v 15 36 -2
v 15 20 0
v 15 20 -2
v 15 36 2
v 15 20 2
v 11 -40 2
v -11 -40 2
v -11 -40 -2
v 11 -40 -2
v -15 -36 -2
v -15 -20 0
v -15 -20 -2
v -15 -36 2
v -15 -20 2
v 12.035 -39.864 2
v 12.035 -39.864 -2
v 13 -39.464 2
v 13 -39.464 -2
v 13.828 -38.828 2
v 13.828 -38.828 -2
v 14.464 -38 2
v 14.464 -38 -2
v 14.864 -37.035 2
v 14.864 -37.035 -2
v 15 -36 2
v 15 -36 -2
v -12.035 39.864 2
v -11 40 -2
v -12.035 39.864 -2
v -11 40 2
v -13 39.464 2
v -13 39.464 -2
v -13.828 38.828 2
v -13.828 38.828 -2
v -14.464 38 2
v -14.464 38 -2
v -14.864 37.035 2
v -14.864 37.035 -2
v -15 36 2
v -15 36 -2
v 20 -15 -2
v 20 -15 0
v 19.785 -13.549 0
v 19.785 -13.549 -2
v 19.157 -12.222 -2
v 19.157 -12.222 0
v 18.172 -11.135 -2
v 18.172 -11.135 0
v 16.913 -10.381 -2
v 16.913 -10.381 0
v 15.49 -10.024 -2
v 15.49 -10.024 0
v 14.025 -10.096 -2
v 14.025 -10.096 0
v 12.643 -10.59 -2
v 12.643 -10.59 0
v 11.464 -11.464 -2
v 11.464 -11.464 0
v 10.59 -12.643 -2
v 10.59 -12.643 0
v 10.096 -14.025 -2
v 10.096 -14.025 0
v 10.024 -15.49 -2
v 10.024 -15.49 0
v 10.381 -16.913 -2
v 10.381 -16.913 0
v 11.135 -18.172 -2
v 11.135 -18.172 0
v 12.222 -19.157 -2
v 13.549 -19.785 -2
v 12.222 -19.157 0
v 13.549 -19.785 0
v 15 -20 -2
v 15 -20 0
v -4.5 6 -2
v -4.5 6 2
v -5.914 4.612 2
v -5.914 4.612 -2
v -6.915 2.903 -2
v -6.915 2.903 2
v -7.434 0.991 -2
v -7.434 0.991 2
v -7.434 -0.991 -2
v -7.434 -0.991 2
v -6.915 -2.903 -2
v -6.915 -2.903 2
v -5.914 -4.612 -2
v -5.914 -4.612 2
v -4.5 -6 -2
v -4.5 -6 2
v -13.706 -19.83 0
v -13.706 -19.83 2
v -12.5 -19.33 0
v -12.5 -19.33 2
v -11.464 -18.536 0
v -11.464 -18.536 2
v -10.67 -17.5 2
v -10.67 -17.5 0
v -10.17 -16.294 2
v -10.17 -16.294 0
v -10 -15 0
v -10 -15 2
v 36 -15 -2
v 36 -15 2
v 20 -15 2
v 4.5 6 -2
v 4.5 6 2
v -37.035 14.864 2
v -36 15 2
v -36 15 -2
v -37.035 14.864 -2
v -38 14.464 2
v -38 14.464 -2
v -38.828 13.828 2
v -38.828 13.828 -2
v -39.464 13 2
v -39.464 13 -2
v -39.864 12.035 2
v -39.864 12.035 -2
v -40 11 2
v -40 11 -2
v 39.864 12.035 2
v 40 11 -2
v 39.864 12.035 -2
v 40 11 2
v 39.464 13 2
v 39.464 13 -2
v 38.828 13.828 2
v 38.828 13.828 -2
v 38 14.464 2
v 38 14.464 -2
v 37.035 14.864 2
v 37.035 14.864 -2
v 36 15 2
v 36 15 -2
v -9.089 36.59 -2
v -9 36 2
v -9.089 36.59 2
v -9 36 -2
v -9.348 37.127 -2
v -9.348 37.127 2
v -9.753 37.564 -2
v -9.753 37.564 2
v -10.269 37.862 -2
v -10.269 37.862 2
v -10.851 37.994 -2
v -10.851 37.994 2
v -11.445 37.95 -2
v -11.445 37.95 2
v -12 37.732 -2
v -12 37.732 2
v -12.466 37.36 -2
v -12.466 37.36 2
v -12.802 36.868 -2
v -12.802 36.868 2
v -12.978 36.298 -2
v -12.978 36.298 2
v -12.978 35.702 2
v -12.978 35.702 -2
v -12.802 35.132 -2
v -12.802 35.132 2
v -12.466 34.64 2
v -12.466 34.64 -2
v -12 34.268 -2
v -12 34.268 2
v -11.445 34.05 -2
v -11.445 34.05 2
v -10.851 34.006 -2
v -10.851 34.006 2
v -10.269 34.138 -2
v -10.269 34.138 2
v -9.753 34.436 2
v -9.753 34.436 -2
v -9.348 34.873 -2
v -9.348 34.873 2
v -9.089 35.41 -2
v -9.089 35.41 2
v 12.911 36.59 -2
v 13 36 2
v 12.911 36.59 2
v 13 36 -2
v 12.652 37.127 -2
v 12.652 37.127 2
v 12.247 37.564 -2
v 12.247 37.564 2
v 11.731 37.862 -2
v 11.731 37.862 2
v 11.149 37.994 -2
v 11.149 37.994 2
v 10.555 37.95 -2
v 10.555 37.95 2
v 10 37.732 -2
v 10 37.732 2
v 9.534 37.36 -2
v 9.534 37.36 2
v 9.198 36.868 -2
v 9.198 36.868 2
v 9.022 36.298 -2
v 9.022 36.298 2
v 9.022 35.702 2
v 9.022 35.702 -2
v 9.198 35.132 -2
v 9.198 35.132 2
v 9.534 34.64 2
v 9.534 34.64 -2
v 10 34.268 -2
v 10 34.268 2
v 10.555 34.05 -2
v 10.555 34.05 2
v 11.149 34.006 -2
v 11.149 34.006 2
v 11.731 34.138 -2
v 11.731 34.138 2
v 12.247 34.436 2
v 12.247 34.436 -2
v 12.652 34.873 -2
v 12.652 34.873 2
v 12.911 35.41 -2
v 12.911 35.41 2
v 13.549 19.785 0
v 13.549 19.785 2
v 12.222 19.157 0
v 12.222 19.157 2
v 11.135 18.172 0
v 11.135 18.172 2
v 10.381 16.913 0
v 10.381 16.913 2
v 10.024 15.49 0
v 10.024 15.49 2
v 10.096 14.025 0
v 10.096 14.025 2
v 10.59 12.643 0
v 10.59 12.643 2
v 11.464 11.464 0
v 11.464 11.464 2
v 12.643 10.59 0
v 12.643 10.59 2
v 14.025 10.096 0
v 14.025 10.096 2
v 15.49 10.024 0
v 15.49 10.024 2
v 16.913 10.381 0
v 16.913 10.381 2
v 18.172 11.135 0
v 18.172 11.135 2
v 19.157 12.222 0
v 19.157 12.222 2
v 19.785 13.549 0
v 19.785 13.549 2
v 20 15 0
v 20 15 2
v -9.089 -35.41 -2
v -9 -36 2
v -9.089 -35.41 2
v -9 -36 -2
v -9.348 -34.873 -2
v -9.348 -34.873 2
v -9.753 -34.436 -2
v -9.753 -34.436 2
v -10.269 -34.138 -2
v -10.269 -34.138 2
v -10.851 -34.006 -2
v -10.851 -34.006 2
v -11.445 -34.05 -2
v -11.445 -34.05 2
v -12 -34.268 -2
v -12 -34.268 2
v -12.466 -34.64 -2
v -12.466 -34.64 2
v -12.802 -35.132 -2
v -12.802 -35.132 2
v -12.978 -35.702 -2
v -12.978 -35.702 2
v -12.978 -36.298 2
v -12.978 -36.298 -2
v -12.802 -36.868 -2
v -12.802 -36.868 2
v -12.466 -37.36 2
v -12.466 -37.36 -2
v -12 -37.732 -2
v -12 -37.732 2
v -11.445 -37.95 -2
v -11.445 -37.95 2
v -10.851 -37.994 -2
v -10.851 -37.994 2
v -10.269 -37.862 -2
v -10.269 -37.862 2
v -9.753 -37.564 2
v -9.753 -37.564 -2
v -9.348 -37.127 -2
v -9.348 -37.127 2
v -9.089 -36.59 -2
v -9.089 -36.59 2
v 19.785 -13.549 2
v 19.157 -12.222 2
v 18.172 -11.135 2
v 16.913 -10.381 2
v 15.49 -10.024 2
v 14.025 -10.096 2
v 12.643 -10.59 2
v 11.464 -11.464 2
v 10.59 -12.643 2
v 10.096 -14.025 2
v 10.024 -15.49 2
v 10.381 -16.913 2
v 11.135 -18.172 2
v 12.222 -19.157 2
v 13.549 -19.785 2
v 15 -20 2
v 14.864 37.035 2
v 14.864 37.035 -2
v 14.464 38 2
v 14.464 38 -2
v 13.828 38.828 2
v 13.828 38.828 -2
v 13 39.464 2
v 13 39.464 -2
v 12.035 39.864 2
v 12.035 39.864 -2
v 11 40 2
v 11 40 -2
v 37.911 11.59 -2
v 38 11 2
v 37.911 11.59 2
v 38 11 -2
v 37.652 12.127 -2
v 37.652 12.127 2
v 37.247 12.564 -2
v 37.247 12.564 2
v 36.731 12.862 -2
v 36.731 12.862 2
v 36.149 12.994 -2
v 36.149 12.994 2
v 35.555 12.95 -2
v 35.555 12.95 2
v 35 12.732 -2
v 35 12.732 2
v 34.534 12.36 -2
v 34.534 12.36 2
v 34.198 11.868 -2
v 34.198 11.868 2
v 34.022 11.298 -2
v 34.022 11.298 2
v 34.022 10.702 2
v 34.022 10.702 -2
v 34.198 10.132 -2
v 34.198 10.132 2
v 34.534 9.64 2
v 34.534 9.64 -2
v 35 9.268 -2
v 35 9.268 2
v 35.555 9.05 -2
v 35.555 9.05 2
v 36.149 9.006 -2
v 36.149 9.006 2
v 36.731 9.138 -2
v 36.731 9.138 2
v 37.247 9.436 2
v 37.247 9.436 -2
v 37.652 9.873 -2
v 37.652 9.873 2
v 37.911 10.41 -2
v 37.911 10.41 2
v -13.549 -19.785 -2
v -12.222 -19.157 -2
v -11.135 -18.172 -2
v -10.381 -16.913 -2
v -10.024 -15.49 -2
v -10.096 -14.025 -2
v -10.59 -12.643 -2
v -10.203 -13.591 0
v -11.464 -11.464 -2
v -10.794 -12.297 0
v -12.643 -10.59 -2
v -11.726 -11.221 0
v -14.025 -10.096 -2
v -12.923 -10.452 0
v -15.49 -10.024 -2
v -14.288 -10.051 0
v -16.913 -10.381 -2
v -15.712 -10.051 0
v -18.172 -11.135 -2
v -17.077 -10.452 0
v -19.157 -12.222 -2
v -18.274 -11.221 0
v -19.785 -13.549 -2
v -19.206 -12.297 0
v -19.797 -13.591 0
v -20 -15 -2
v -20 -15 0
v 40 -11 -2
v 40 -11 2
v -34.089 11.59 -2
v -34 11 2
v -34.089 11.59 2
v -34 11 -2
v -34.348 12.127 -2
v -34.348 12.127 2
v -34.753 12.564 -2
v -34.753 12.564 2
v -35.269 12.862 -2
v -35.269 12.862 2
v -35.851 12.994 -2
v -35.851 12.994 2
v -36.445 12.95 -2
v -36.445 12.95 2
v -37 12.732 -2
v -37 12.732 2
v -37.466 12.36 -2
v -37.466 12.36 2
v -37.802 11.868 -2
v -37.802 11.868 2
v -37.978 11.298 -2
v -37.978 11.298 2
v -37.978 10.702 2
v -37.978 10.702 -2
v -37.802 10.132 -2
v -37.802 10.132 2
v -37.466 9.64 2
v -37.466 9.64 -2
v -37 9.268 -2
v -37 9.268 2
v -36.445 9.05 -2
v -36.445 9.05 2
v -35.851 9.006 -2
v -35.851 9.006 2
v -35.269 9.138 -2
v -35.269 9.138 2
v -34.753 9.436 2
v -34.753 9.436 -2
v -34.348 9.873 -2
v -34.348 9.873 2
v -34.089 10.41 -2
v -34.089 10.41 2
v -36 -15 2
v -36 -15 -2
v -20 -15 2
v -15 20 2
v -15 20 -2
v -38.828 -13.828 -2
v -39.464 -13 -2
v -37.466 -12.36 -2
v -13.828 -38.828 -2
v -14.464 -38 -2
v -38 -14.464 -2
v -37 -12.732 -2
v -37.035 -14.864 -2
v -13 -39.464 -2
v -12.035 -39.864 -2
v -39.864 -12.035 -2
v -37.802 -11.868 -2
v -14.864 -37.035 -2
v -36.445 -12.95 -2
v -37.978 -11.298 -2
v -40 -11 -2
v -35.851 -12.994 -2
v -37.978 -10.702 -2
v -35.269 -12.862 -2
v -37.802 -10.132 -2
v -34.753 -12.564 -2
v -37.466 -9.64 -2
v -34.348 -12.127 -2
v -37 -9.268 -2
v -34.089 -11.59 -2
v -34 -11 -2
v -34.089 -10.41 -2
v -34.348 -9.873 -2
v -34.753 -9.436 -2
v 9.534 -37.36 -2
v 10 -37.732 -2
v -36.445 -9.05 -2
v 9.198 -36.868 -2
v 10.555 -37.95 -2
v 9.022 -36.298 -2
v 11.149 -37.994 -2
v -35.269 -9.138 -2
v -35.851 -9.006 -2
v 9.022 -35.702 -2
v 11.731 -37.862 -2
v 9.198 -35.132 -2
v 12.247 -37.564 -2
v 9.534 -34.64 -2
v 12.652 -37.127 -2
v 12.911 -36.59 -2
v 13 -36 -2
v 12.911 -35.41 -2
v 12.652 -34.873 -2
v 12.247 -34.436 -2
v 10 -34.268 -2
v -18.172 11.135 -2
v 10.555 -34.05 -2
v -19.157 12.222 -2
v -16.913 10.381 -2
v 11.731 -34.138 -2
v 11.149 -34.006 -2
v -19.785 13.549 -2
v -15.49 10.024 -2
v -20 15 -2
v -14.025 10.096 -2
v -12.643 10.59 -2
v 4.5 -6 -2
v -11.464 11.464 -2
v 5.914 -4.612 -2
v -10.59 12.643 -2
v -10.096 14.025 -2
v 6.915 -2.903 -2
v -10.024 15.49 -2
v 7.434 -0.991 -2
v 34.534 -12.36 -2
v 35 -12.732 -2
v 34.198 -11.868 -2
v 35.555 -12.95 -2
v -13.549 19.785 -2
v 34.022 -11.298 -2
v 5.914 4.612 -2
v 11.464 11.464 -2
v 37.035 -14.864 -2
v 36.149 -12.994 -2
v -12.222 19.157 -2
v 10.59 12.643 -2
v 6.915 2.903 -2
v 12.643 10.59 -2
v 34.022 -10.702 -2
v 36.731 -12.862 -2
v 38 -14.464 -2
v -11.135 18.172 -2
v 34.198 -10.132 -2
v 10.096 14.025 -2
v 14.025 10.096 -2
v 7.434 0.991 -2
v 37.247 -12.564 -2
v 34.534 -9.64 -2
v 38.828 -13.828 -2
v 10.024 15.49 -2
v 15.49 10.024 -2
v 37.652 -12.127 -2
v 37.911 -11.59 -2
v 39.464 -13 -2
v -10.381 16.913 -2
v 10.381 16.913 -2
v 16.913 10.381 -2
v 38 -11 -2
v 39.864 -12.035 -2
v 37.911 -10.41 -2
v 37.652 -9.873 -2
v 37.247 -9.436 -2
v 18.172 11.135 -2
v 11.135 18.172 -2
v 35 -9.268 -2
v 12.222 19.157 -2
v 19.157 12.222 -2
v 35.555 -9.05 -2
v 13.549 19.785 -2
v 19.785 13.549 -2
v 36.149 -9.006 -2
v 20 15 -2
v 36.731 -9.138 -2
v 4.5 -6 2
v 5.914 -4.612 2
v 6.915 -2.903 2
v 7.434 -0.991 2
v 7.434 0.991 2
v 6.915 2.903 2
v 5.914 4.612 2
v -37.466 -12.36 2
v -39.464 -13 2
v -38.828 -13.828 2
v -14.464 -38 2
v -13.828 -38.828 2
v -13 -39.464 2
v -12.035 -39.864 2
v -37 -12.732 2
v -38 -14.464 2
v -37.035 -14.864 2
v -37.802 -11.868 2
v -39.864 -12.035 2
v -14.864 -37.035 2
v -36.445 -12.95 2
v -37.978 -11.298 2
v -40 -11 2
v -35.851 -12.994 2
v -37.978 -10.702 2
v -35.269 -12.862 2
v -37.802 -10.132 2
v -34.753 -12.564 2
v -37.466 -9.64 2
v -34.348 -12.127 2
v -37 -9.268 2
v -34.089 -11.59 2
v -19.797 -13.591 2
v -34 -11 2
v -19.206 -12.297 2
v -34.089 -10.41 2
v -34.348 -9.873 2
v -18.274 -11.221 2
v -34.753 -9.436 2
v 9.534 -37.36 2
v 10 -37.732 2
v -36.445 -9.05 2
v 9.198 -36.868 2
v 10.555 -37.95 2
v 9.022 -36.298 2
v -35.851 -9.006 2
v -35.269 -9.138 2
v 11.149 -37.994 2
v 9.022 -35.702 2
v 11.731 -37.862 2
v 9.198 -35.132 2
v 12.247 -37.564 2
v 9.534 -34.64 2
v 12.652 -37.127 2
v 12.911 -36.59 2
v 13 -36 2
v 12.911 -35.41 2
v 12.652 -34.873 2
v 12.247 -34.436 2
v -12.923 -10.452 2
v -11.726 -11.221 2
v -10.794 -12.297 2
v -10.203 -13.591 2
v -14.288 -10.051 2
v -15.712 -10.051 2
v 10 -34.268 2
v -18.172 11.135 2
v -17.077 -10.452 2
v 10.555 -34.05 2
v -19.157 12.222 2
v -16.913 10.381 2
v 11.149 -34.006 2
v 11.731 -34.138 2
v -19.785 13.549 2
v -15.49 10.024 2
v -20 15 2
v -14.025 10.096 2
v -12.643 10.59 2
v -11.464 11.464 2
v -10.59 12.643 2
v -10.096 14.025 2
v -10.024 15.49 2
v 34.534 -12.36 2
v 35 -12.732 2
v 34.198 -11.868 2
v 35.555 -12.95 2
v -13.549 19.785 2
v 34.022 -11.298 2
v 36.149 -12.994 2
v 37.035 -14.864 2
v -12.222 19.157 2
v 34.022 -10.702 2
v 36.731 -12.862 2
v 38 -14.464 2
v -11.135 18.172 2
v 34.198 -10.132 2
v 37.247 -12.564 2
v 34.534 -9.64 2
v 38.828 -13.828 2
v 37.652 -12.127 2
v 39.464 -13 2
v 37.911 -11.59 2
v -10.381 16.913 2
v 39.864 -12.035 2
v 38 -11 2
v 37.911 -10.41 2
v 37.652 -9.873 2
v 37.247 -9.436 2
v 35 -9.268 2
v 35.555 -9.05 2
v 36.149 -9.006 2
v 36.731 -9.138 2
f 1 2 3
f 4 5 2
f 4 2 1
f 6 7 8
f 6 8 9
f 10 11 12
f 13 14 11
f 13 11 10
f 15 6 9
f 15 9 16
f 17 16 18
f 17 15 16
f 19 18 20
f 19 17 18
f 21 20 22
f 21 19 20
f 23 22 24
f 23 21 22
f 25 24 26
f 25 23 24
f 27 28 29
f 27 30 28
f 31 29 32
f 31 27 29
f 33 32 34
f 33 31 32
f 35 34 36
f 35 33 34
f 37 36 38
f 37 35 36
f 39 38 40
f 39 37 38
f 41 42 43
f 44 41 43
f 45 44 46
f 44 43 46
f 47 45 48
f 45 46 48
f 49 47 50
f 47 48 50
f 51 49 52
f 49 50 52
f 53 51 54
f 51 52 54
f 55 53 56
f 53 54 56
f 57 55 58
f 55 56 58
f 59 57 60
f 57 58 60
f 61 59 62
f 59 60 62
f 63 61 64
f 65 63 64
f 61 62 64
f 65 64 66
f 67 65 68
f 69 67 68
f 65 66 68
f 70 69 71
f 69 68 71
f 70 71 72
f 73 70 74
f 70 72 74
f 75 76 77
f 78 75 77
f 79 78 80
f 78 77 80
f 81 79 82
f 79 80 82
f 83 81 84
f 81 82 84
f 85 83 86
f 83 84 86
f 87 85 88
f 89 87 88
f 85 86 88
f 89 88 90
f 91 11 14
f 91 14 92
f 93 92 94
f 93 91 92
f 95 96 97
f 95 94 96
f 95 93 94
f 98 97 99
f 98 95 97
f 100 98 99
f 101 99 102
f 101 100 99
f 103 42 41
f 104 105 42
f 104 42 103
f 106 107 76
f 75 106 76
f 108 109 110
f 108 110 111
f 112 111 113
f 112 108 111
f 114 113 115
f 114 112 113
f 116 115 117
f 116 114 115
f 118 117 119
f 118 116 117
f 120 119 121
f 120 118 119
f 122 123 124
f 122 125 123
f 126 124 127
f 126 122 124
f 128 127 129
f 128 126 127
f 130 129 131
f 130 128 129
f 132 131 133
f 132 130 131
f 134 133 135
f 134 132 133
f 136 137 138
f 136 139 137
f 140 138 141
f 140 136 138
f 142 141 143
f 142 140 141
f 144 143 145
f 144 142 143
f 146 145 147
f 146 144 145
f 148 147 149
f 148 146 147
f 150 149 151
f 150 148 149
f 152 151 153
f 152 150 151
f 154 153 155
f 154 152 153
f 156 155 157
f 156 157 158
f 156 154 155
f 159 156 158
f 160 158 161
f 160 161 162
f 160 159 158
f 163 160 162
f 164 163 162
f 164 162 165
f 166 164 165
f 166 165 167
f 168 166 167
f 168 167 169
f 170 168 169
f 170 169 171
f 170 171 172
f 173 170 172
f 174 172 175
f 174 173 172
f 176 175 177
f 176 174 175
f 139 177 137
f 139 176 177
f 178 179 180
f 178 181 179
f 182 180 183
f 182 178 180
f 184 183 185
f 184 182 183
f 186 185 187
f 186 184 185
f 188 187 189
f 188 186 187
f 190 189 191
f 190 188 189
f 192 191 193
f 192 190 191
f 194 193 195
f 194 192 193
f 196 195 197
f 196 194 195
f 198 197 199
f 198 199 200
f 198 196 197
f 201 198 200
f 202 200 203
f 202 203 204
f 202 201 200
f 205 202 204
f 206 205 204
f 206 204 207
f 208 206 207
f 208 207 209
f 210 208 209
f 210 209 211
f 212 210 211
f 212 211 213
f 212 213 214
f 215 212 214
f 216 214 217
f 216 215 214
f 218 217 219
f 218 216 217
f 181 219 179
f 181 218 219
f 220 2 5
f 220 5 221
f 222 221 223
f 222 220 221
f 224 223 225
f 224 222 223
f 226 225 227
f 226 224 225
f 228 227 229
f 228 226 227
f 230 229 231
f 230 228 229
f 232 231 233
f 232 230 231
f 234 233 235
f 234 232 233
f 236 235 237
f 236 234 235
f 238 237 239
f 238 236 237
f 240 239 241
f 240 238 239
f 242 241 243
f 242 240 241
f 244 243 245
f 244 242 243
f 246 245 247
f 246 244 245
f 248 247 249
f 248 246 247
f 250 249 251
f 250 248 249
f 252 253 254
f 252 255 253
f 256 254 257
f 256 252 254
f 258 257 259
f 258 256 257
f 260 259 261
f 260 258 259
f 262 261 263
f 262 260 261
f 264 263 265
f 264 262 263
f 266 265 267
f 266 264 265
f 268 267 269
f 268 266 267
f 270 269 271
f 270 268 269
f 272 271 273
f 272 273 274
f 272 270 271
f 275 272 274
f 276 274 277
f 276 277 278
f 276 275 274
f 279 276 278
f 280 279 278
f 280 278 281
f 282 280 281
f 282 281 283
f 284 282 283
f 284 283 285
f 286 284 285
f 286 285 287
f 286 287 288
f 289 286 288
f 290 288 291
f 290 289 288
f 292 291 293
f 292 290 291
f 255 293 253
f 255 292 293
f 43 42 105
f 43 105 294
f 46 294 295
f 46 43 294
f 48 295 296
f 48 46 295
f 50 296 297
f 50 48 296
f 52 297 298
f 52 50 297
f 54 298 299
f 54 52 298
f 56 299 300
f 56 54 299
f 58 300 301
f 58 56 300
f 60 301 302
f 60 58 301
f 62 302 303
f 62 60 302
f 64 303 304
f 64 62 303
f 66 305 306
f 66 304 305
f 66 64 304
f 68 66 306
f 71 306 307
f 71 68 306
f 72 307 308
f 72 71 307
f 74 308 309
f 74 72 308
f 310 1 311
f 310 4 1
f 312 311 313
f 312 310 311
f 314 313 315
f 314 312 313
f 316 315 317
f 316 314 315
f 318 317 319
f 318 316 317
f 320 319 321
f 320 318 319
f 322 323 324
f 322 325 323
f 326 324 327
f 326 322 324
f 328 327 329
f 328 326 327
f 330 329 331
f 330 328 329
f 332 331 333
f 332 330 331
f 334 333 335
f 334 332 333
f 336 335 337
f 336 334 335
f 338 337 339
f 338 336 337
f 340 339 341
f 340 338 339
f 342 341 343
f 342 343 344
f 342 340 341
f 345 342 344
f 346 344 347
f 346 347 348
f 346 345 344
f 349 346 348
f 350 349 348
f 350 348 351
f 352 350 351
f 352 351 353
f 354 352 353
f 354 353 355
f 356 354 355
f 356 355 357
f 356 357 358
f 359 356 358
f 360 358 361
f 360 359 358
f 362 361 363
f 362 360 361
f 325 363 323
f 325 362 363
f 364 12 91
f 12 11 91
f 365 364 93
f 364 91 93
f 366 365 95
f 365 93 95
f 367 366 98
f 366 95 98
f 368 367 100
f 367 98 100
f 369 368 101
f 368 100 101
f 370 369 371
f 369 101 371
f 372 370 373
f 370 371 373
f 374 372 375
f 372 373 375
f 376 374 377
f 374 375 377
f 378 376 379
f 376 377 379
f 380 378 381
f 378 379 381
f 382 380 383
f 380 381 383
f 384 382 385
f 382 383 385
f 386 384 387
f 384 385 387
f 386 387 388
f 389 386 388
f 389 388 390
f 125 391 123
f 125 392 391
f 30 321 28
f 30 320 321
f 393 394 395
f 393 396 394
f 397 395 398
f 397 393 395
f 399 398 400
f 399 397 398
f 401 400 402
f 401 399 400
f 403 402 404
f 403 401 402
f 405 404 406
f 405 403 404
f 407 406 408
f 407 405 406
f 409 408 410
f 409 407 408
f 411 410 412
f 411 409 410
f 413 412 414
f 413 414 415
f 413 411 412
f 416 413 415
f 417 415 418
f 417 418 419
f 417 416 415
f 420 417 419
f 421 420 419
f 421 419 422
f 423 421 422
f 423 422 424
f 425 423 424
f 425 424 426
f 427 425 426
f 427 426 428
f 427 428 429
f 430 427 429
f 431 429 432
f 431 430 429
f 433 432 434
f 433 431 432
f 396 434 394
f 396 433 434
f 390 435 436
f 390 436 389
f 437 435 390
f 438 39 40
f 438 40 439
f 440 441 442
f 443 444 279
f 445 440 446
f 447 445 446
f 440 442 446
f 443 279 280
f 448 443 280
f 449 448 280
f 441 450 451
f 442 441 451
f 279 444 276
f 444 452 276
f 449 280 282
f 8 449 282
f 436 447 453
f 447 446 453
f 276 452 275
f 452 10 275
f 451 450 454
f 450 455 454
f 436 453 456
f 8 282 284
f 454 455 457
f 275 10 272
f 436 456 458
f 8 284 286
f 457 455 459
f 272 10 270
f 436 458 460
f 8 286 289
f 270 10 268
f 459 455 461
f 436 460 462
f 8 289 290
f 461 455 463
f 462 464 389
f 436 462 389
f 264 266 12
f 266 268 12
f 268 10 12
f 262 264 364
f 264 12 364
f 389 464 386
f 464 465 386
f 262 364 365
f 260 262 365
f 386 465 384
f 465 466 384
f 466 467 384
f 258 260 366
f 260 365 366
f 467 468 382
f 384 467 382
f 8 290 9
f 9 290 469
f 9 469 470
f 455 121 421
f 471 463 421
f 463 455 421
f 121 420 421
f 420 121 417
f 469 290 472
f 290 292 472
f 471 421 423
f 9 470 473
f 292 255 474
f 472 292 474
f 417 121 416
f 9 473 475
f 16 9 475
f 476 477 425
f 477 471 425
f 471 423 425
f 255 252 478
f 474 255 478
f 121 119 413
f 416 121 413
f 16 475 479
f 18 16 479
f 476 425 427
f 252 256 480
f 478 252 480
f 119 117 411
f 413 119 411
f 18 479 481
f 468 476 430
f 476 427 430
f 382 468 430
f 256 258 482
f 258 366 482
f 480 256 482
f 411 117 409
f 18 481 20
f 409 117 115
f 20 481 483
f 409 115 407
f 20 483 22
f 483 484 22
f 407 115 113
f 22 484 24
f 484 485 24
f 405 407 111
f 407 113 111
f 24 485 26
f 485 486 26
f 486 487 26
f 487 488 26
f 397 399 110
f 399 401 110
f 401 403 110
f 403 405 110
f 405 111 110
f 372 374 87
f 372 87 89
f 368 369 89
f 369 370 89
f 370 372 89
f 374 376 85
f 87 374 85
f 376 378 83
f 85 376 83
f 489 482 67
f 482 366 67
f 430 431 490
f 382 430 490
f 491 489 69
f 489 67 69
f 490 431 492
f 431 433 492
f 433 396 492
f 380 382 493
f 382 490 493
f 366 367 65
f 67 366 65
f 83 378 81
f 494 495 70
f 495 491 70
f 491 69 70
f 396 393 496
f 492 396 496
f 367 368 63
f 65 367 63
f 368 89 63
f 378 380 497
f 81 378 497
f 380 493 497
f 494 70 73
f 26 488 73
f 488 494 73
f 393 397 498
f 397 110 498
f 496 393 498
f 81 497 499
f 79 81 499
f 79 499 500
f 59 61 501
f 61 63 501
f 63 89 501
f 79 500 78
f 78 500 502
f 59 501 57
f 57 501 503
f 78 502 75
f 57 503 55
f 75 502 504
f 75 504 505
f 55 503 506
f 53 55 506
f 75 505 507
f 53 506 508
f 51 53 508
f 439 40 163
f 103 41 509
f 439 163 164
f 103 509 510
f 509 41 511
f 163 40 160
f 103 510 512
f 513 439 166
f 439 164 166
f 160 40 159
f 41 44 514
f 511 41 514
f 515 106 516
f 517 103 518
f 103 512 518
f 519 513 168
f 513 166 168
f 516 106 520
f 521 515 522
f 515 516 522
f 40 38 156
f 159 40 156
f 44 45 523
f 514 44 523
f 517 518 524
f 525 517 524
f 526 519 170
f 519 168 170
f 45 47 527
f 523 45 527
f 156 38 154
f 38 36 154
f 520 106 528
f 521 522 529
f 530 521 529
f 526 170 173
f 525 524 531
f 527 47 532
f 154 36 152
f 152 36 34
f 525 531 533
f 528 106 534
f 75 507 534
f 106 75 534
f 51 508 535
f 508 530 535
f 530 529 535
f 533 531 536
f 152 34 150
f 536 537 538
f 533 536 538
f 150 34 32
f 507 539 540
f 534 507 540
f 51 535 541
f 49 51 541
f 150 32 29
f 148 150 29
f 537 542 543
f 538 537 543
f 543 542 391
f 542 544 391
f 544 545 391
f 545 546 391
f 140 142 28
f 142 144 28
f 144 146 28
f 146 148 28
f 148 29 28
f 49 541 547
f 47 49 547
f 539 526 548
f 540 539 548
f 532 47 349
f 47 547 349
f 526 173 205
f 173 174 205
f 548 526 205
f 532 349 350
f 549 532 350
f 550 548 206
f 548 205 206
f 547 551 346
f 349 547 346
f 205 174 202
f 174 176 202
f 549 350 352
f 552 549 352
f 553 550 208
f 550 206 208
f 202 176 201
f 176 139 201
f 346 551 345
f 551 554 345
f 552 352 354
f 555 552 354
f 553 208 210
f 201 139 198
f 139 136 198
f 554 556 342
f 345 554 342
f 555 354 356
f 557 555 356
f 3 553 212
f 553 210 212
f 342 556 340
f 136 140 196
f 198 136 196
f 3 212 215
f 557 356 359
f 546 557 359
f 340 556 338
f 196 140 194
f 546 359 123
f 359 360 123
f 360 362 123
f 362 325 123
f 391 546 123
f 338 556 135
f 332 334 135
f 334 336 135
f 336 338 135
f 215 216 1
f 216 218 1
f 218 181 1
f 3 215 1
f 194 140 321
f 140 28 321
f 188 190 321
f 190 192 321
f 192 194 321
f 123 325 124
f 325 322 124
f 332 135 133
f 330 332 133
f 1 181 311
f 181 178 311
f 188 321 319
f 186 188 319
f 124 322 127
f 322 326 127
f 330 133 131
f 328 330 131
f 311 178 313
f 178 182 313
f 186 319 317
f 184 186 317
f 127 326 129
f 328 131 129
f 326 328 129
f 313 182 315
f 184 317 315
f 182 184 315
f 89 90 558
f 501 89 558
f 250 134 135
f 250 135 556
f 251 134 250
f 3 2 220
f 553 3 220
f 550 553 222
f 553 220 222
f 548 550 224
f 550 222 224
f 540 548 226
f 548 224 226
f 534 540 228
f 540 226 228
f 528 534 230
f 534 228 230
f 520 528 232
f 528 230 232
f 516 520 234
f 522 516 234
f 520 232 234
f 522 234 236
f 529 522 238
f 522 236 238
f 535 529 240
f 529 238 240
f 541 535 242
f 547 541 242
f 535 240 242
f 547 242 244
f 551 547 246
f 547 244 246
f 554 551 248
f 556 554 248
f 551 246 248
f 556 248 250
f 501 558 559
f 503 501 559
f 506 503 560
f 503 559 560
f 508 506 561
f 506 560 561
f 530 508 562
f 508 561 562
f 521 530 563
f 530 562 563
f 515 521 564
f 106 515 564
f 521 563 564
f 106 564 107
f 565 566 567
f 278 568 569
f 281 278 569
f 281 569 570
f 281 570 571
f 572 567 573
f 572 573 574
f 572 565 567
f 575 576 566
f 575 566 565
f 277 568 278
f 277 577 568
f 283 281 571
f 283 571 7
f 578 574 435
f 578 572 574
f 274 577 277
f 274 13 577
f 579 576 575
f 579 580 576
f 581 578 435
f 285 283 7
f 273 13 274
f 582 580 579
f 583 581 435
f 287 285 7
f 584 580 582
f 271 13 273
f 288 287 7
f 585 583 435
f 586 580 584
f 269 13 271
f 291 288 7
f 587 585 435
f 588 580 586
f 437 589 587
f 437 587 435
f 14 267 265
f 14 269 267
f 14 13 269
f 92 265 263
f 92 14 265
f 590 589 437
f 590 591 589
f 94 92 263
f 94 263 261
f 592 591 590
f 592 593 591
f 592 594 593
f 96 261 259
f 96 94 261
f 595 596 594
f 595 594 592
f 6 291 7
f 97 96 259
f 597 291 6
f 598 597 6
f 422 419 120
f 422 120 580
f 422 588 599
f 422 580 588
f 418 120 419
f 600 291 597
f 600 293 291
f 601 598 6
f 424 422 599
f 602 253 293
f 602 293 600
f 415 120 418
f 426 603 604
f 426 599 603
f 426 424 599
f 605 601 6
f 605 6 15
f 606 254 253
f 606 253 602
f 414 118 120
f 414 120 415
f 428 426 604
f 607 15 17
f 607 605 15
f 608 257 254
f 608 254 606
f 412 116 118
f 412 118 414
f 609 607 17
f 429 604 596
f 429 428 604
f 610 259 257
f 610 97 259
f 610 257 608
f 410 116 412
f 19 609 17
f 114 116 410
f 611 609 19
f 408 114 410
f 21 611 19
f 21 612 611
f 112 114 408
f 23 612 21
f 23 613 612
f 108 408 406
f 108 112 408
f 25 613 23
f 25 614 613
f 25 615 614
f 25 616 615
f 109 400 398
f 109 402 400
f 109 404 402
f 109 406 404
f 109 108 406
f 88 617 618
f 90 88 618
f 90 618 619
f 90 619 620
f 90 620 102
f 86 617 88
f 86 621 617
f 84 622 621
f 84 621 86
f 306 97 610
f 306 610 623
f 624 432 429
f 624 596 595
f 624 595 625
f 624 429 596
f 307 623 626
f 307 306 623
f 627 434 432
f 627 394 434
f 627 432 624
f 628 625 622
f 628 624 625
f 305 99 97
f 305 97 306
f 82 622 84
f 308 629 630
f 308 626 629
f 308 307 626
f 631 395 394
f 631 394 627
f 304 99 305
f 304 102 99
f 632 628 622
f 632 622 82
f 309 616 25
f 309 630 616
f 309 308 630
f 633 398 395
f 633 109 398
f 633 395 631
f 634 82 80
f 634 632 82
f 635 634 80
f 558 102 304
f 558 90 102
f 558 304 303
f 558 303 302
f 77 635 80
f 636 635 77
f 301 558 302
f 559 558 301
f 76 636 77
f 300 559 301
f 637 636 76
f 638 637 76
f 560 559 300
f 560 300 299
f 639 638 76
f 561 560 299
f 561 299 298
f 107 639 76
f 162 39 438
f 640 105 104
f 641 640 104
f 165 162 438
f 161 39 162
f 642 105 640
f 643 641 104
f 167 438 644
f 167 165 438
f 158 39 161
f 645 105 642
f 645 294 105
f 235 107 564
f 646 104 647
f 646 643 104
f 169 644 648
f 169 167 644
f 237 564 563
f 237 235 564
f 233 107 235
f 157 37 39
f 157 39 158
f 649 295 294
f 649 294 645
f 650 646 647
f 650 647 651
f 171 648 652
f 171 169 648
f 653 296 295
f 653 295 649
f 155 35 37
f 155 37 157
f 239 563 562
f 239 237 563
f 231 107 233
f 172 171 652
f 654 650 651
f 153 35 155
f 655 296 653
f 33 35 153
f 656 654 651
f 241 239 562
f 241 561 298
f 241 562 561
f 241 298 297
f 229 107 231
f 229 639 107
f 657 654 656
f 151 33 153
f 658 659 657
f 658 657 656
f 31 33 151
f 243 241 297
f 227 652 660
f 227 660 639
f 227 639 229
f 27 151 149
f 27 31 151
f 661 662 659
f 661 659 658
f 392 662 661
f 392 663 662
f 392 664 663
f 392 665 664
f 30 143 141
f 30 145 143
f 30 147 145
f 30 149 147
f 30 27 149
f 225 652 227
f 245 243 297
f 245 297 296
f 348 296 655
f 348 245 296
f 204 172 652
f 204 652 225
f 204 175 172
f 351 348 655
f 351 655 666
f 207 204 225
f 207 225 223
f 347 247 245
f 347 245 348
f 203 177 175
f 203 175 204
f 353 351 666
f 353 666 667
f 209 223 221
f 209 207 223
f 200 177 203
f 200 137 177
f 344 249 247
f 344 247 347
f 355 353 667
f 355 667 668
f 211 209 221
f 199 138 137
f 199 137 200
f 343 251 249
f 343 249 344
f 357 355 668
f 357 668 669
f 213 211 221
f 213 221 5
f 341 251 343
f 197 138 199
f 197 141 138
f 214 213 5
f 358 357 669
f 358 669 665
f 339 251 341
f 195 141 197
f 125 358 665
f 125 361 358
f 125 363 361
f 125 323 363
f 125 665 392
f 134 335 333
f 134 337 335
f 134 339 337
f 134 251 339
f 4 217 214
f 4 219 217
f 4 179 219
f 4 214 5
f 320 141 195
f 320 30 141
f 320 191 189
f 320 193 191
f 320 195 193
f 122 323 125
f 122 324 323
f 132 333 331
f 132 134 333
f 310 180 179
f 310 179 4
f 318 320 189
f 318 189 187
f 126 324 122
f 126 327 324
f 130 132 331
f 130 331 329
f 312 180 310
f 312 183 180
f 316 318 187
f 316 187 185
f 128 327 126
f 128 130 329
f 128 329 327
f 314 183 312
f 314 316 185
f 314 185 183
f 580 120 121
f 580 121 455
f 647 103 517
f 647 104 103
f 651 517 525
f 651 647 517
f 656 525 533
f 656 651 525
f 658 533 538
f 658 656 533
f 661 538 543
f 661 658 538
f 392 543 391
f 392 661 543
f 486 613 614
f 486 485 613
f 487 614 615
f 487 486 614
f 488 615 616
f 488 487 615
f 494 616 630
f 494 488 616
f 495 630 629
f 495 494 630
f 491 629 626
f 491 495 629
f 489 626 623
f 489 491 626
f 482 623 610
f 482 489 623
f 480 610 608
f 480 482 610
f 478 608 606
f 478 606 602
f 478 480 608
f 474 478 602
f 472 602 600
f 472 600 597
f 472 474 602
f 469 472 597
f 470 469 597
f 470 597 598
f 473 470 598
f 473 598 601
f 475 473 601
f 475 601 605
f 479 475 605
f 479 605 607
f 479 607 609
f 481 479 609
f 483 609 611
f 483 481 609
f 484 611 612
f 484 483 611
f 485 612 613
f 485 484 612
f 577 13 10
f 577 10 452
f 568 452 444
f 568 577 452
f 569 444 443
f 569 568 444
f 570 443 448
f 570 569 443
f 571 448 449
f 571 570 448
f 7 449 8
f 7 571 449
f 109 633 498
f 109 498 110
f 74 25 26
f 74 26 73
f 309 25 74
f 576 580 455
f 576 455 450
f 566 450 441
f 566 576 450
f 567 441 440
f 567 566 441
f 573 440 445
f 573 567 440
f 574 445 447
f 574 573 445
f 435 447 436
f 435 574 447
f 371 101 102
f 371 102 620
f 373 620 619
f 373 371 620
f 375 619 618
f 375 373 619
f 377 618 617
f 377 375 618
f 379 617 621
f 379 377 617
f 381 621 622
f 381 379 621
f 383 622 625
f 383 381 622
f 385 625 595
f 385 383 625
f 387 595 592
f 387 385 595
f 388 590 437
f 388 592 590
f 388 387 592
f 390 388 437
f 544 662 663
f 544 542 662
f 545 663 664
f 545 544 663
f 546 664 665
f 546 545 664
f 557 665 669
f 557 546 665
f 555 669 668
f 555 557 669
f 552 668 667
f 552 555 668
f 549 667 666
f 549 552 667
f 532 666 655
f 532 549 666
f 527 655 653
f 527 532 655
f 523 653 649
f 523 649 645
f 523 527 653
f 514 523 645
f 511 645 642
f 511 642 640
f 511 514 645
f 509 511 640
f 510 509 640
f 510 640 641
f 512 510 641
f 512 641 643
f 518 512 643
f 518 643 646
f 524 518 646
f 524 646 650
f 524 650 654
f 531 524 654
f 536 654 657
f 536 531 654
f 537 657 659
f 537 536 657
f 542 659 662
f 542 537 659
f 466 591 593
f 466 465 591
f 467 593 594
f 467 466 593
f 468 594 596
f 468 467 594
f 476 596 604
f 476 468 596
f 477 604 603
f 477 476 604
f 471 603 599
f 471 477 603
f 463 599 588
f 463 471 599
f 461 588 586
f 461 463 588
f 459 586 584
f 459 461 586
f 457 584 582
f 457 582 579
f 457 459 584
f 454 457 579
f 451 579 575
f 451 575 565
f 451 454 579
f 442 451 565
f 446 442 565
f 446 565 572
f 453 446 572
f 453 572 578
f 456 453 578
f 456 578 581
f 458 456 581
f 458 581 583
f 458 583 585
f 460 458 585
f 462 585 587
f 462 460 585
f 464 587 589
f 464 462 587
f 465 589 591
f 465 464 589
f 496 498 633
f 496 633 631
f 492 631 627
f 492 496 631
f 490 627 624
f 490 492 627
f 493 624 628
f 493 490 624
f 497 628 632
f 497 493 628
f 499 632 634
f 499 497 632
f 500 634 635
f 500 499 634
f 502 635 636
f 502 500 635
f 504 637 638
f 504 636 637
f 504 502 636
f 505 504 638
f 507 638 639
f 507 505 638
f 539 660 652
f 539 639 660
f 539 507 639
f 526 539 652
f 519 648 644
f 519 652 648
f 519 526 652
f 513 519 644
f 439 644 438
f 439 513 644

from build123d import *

# Parameters (mm, degrees)
F1_R          = 2
F3_DEPTH      = 2
F4_DEPTH      = 2.001
F4_DEPTH_BACK = 2.001
F2_R          = 5
F5_DEPTH      = 2.001
F5_DEPTH_BACK = 2.001


with BuildPart() as f3:
    # F1 (on Top) → F3 (new body, symmetric)
    with BuildSketch(Plane.XY):
        with BuildLine():
            Line((-15, 36), (-15, 15))
            Line((-15, 15), (-36, 15))
            ThreePointArc((-36, 15), (-38.8284271247, 13.8284271247), (-40, 11))
            Line((-40, 11), (-40, 0))
            Line((-40, 0), (-40, -11))
            ThreePointArc((-40, -11), (-38.8284271247, -13.8284271247), (-36, -15))
            Line((-36, -15), (-15, -15))
            Line((-15, -15), (-15, -36))
            ThreePointArc((-15, -36), (-13.8284271247, -38.8284271247), (-11, -40))
            Line((-11, -40), (0, -40))
            Line((0, -40), (11, -40))
            ThreePointArc((11, -40), (13.8284271247, -38.8284271247), (15, -36))
            Line((15, -36), (15, -15))
            Line((15, -15), (36, -15))
            ThreePointArc((36, -15), (38.8284271247, -13.8284271247), (40, -11))
            Line((40, -11), (40, 0))
            Line((40, 0), (40, 11))
            ThreePointArc((40, 11), (38.8284271247, 13.8284271247), (36, 15))
            Line((36, 15), (15, 15))
            Line((15, 15), (15, 36))
            ThreePointArc((15, 36), (13.8284271247, 38.8284271247), (11, 40))
            Line((11, 40), (0, 40))
            Line((0, 40), (-11, 40))
            ThreePointArc((-11, 40), (-13.8284271247, 38.8284271247), (-15, 36))
        make_face()
        with Locations((-11, -36)):
            Circle(F1_R, mode=Mode.SUBTRACT)
        with Locations((-36, -11)):
            Circle(F1_R, mode=Mode.SUBTRACT)
        with Locations((11, -36)):
            Circle(F1_R, mode=Mode.SUBTRACT)
        with Locations((36, -11)):
            Circle(F1_R, mode=Mode.SUBTRACT)
        with Locations((-36, 11)):
            Circle(F1_R, mode=Mode.SUBTRACT)
        with Locations((-11, 36)):
            Circle(F1_R, mode=Mode.SUBTRACT)
        with Locations((36, 11)):
            Circle(F1_R, mode=Mode.SUBTRACT)
        with Locations((11, 36)):
            Circle(F1_R, mode=Mode.SUBTRACT)
    extrude(amount=F3_DEPTH, both=True)

    # F0 (on Top) → F4 (cut, two sides)
    with BuildSketch(Plane.XY) as f4_sk:
        with BuildLine():
            Line((4.5, 6), (-4.5, 6))
            ThreePointArc((-4.5, 6), (-7.5, 0), (-4.5, -6))
            Line((-4.5, -6), (4.5, -6))
            ThreePointArc((4.5, -6), (7.5, 0), (4.5, 6))
        make_face()
    extrude(amount=-F4_DEPTH, mode=Mode.SUBTRACT)
    extrude(f4_sk.sketch, amount=F4_DEPTH_BACK, mode=Mode.SUBTRACT)

    # F2 (on Top) → F5 (cut, two sides)
    with BuildSketch(Plane.XY) as f5_sk:
        with Locations((-15, 15)):
            Circle(F2_R)
        with Locations((-15, -15)):
            Circle(F2_R)
        with Locations((15, -15)):
            Circle(F2_R)
        with Locations((15, 15)):
            Circle(F2_R)
    extrude(amount=-F5_DEPTH, mode=Mode.SUBTRACT)
    extrude(f5_sk.sketch, amount=F5_DEPTH_BACK, mode=Mode.SUBTRACT)


solid = f3.part
